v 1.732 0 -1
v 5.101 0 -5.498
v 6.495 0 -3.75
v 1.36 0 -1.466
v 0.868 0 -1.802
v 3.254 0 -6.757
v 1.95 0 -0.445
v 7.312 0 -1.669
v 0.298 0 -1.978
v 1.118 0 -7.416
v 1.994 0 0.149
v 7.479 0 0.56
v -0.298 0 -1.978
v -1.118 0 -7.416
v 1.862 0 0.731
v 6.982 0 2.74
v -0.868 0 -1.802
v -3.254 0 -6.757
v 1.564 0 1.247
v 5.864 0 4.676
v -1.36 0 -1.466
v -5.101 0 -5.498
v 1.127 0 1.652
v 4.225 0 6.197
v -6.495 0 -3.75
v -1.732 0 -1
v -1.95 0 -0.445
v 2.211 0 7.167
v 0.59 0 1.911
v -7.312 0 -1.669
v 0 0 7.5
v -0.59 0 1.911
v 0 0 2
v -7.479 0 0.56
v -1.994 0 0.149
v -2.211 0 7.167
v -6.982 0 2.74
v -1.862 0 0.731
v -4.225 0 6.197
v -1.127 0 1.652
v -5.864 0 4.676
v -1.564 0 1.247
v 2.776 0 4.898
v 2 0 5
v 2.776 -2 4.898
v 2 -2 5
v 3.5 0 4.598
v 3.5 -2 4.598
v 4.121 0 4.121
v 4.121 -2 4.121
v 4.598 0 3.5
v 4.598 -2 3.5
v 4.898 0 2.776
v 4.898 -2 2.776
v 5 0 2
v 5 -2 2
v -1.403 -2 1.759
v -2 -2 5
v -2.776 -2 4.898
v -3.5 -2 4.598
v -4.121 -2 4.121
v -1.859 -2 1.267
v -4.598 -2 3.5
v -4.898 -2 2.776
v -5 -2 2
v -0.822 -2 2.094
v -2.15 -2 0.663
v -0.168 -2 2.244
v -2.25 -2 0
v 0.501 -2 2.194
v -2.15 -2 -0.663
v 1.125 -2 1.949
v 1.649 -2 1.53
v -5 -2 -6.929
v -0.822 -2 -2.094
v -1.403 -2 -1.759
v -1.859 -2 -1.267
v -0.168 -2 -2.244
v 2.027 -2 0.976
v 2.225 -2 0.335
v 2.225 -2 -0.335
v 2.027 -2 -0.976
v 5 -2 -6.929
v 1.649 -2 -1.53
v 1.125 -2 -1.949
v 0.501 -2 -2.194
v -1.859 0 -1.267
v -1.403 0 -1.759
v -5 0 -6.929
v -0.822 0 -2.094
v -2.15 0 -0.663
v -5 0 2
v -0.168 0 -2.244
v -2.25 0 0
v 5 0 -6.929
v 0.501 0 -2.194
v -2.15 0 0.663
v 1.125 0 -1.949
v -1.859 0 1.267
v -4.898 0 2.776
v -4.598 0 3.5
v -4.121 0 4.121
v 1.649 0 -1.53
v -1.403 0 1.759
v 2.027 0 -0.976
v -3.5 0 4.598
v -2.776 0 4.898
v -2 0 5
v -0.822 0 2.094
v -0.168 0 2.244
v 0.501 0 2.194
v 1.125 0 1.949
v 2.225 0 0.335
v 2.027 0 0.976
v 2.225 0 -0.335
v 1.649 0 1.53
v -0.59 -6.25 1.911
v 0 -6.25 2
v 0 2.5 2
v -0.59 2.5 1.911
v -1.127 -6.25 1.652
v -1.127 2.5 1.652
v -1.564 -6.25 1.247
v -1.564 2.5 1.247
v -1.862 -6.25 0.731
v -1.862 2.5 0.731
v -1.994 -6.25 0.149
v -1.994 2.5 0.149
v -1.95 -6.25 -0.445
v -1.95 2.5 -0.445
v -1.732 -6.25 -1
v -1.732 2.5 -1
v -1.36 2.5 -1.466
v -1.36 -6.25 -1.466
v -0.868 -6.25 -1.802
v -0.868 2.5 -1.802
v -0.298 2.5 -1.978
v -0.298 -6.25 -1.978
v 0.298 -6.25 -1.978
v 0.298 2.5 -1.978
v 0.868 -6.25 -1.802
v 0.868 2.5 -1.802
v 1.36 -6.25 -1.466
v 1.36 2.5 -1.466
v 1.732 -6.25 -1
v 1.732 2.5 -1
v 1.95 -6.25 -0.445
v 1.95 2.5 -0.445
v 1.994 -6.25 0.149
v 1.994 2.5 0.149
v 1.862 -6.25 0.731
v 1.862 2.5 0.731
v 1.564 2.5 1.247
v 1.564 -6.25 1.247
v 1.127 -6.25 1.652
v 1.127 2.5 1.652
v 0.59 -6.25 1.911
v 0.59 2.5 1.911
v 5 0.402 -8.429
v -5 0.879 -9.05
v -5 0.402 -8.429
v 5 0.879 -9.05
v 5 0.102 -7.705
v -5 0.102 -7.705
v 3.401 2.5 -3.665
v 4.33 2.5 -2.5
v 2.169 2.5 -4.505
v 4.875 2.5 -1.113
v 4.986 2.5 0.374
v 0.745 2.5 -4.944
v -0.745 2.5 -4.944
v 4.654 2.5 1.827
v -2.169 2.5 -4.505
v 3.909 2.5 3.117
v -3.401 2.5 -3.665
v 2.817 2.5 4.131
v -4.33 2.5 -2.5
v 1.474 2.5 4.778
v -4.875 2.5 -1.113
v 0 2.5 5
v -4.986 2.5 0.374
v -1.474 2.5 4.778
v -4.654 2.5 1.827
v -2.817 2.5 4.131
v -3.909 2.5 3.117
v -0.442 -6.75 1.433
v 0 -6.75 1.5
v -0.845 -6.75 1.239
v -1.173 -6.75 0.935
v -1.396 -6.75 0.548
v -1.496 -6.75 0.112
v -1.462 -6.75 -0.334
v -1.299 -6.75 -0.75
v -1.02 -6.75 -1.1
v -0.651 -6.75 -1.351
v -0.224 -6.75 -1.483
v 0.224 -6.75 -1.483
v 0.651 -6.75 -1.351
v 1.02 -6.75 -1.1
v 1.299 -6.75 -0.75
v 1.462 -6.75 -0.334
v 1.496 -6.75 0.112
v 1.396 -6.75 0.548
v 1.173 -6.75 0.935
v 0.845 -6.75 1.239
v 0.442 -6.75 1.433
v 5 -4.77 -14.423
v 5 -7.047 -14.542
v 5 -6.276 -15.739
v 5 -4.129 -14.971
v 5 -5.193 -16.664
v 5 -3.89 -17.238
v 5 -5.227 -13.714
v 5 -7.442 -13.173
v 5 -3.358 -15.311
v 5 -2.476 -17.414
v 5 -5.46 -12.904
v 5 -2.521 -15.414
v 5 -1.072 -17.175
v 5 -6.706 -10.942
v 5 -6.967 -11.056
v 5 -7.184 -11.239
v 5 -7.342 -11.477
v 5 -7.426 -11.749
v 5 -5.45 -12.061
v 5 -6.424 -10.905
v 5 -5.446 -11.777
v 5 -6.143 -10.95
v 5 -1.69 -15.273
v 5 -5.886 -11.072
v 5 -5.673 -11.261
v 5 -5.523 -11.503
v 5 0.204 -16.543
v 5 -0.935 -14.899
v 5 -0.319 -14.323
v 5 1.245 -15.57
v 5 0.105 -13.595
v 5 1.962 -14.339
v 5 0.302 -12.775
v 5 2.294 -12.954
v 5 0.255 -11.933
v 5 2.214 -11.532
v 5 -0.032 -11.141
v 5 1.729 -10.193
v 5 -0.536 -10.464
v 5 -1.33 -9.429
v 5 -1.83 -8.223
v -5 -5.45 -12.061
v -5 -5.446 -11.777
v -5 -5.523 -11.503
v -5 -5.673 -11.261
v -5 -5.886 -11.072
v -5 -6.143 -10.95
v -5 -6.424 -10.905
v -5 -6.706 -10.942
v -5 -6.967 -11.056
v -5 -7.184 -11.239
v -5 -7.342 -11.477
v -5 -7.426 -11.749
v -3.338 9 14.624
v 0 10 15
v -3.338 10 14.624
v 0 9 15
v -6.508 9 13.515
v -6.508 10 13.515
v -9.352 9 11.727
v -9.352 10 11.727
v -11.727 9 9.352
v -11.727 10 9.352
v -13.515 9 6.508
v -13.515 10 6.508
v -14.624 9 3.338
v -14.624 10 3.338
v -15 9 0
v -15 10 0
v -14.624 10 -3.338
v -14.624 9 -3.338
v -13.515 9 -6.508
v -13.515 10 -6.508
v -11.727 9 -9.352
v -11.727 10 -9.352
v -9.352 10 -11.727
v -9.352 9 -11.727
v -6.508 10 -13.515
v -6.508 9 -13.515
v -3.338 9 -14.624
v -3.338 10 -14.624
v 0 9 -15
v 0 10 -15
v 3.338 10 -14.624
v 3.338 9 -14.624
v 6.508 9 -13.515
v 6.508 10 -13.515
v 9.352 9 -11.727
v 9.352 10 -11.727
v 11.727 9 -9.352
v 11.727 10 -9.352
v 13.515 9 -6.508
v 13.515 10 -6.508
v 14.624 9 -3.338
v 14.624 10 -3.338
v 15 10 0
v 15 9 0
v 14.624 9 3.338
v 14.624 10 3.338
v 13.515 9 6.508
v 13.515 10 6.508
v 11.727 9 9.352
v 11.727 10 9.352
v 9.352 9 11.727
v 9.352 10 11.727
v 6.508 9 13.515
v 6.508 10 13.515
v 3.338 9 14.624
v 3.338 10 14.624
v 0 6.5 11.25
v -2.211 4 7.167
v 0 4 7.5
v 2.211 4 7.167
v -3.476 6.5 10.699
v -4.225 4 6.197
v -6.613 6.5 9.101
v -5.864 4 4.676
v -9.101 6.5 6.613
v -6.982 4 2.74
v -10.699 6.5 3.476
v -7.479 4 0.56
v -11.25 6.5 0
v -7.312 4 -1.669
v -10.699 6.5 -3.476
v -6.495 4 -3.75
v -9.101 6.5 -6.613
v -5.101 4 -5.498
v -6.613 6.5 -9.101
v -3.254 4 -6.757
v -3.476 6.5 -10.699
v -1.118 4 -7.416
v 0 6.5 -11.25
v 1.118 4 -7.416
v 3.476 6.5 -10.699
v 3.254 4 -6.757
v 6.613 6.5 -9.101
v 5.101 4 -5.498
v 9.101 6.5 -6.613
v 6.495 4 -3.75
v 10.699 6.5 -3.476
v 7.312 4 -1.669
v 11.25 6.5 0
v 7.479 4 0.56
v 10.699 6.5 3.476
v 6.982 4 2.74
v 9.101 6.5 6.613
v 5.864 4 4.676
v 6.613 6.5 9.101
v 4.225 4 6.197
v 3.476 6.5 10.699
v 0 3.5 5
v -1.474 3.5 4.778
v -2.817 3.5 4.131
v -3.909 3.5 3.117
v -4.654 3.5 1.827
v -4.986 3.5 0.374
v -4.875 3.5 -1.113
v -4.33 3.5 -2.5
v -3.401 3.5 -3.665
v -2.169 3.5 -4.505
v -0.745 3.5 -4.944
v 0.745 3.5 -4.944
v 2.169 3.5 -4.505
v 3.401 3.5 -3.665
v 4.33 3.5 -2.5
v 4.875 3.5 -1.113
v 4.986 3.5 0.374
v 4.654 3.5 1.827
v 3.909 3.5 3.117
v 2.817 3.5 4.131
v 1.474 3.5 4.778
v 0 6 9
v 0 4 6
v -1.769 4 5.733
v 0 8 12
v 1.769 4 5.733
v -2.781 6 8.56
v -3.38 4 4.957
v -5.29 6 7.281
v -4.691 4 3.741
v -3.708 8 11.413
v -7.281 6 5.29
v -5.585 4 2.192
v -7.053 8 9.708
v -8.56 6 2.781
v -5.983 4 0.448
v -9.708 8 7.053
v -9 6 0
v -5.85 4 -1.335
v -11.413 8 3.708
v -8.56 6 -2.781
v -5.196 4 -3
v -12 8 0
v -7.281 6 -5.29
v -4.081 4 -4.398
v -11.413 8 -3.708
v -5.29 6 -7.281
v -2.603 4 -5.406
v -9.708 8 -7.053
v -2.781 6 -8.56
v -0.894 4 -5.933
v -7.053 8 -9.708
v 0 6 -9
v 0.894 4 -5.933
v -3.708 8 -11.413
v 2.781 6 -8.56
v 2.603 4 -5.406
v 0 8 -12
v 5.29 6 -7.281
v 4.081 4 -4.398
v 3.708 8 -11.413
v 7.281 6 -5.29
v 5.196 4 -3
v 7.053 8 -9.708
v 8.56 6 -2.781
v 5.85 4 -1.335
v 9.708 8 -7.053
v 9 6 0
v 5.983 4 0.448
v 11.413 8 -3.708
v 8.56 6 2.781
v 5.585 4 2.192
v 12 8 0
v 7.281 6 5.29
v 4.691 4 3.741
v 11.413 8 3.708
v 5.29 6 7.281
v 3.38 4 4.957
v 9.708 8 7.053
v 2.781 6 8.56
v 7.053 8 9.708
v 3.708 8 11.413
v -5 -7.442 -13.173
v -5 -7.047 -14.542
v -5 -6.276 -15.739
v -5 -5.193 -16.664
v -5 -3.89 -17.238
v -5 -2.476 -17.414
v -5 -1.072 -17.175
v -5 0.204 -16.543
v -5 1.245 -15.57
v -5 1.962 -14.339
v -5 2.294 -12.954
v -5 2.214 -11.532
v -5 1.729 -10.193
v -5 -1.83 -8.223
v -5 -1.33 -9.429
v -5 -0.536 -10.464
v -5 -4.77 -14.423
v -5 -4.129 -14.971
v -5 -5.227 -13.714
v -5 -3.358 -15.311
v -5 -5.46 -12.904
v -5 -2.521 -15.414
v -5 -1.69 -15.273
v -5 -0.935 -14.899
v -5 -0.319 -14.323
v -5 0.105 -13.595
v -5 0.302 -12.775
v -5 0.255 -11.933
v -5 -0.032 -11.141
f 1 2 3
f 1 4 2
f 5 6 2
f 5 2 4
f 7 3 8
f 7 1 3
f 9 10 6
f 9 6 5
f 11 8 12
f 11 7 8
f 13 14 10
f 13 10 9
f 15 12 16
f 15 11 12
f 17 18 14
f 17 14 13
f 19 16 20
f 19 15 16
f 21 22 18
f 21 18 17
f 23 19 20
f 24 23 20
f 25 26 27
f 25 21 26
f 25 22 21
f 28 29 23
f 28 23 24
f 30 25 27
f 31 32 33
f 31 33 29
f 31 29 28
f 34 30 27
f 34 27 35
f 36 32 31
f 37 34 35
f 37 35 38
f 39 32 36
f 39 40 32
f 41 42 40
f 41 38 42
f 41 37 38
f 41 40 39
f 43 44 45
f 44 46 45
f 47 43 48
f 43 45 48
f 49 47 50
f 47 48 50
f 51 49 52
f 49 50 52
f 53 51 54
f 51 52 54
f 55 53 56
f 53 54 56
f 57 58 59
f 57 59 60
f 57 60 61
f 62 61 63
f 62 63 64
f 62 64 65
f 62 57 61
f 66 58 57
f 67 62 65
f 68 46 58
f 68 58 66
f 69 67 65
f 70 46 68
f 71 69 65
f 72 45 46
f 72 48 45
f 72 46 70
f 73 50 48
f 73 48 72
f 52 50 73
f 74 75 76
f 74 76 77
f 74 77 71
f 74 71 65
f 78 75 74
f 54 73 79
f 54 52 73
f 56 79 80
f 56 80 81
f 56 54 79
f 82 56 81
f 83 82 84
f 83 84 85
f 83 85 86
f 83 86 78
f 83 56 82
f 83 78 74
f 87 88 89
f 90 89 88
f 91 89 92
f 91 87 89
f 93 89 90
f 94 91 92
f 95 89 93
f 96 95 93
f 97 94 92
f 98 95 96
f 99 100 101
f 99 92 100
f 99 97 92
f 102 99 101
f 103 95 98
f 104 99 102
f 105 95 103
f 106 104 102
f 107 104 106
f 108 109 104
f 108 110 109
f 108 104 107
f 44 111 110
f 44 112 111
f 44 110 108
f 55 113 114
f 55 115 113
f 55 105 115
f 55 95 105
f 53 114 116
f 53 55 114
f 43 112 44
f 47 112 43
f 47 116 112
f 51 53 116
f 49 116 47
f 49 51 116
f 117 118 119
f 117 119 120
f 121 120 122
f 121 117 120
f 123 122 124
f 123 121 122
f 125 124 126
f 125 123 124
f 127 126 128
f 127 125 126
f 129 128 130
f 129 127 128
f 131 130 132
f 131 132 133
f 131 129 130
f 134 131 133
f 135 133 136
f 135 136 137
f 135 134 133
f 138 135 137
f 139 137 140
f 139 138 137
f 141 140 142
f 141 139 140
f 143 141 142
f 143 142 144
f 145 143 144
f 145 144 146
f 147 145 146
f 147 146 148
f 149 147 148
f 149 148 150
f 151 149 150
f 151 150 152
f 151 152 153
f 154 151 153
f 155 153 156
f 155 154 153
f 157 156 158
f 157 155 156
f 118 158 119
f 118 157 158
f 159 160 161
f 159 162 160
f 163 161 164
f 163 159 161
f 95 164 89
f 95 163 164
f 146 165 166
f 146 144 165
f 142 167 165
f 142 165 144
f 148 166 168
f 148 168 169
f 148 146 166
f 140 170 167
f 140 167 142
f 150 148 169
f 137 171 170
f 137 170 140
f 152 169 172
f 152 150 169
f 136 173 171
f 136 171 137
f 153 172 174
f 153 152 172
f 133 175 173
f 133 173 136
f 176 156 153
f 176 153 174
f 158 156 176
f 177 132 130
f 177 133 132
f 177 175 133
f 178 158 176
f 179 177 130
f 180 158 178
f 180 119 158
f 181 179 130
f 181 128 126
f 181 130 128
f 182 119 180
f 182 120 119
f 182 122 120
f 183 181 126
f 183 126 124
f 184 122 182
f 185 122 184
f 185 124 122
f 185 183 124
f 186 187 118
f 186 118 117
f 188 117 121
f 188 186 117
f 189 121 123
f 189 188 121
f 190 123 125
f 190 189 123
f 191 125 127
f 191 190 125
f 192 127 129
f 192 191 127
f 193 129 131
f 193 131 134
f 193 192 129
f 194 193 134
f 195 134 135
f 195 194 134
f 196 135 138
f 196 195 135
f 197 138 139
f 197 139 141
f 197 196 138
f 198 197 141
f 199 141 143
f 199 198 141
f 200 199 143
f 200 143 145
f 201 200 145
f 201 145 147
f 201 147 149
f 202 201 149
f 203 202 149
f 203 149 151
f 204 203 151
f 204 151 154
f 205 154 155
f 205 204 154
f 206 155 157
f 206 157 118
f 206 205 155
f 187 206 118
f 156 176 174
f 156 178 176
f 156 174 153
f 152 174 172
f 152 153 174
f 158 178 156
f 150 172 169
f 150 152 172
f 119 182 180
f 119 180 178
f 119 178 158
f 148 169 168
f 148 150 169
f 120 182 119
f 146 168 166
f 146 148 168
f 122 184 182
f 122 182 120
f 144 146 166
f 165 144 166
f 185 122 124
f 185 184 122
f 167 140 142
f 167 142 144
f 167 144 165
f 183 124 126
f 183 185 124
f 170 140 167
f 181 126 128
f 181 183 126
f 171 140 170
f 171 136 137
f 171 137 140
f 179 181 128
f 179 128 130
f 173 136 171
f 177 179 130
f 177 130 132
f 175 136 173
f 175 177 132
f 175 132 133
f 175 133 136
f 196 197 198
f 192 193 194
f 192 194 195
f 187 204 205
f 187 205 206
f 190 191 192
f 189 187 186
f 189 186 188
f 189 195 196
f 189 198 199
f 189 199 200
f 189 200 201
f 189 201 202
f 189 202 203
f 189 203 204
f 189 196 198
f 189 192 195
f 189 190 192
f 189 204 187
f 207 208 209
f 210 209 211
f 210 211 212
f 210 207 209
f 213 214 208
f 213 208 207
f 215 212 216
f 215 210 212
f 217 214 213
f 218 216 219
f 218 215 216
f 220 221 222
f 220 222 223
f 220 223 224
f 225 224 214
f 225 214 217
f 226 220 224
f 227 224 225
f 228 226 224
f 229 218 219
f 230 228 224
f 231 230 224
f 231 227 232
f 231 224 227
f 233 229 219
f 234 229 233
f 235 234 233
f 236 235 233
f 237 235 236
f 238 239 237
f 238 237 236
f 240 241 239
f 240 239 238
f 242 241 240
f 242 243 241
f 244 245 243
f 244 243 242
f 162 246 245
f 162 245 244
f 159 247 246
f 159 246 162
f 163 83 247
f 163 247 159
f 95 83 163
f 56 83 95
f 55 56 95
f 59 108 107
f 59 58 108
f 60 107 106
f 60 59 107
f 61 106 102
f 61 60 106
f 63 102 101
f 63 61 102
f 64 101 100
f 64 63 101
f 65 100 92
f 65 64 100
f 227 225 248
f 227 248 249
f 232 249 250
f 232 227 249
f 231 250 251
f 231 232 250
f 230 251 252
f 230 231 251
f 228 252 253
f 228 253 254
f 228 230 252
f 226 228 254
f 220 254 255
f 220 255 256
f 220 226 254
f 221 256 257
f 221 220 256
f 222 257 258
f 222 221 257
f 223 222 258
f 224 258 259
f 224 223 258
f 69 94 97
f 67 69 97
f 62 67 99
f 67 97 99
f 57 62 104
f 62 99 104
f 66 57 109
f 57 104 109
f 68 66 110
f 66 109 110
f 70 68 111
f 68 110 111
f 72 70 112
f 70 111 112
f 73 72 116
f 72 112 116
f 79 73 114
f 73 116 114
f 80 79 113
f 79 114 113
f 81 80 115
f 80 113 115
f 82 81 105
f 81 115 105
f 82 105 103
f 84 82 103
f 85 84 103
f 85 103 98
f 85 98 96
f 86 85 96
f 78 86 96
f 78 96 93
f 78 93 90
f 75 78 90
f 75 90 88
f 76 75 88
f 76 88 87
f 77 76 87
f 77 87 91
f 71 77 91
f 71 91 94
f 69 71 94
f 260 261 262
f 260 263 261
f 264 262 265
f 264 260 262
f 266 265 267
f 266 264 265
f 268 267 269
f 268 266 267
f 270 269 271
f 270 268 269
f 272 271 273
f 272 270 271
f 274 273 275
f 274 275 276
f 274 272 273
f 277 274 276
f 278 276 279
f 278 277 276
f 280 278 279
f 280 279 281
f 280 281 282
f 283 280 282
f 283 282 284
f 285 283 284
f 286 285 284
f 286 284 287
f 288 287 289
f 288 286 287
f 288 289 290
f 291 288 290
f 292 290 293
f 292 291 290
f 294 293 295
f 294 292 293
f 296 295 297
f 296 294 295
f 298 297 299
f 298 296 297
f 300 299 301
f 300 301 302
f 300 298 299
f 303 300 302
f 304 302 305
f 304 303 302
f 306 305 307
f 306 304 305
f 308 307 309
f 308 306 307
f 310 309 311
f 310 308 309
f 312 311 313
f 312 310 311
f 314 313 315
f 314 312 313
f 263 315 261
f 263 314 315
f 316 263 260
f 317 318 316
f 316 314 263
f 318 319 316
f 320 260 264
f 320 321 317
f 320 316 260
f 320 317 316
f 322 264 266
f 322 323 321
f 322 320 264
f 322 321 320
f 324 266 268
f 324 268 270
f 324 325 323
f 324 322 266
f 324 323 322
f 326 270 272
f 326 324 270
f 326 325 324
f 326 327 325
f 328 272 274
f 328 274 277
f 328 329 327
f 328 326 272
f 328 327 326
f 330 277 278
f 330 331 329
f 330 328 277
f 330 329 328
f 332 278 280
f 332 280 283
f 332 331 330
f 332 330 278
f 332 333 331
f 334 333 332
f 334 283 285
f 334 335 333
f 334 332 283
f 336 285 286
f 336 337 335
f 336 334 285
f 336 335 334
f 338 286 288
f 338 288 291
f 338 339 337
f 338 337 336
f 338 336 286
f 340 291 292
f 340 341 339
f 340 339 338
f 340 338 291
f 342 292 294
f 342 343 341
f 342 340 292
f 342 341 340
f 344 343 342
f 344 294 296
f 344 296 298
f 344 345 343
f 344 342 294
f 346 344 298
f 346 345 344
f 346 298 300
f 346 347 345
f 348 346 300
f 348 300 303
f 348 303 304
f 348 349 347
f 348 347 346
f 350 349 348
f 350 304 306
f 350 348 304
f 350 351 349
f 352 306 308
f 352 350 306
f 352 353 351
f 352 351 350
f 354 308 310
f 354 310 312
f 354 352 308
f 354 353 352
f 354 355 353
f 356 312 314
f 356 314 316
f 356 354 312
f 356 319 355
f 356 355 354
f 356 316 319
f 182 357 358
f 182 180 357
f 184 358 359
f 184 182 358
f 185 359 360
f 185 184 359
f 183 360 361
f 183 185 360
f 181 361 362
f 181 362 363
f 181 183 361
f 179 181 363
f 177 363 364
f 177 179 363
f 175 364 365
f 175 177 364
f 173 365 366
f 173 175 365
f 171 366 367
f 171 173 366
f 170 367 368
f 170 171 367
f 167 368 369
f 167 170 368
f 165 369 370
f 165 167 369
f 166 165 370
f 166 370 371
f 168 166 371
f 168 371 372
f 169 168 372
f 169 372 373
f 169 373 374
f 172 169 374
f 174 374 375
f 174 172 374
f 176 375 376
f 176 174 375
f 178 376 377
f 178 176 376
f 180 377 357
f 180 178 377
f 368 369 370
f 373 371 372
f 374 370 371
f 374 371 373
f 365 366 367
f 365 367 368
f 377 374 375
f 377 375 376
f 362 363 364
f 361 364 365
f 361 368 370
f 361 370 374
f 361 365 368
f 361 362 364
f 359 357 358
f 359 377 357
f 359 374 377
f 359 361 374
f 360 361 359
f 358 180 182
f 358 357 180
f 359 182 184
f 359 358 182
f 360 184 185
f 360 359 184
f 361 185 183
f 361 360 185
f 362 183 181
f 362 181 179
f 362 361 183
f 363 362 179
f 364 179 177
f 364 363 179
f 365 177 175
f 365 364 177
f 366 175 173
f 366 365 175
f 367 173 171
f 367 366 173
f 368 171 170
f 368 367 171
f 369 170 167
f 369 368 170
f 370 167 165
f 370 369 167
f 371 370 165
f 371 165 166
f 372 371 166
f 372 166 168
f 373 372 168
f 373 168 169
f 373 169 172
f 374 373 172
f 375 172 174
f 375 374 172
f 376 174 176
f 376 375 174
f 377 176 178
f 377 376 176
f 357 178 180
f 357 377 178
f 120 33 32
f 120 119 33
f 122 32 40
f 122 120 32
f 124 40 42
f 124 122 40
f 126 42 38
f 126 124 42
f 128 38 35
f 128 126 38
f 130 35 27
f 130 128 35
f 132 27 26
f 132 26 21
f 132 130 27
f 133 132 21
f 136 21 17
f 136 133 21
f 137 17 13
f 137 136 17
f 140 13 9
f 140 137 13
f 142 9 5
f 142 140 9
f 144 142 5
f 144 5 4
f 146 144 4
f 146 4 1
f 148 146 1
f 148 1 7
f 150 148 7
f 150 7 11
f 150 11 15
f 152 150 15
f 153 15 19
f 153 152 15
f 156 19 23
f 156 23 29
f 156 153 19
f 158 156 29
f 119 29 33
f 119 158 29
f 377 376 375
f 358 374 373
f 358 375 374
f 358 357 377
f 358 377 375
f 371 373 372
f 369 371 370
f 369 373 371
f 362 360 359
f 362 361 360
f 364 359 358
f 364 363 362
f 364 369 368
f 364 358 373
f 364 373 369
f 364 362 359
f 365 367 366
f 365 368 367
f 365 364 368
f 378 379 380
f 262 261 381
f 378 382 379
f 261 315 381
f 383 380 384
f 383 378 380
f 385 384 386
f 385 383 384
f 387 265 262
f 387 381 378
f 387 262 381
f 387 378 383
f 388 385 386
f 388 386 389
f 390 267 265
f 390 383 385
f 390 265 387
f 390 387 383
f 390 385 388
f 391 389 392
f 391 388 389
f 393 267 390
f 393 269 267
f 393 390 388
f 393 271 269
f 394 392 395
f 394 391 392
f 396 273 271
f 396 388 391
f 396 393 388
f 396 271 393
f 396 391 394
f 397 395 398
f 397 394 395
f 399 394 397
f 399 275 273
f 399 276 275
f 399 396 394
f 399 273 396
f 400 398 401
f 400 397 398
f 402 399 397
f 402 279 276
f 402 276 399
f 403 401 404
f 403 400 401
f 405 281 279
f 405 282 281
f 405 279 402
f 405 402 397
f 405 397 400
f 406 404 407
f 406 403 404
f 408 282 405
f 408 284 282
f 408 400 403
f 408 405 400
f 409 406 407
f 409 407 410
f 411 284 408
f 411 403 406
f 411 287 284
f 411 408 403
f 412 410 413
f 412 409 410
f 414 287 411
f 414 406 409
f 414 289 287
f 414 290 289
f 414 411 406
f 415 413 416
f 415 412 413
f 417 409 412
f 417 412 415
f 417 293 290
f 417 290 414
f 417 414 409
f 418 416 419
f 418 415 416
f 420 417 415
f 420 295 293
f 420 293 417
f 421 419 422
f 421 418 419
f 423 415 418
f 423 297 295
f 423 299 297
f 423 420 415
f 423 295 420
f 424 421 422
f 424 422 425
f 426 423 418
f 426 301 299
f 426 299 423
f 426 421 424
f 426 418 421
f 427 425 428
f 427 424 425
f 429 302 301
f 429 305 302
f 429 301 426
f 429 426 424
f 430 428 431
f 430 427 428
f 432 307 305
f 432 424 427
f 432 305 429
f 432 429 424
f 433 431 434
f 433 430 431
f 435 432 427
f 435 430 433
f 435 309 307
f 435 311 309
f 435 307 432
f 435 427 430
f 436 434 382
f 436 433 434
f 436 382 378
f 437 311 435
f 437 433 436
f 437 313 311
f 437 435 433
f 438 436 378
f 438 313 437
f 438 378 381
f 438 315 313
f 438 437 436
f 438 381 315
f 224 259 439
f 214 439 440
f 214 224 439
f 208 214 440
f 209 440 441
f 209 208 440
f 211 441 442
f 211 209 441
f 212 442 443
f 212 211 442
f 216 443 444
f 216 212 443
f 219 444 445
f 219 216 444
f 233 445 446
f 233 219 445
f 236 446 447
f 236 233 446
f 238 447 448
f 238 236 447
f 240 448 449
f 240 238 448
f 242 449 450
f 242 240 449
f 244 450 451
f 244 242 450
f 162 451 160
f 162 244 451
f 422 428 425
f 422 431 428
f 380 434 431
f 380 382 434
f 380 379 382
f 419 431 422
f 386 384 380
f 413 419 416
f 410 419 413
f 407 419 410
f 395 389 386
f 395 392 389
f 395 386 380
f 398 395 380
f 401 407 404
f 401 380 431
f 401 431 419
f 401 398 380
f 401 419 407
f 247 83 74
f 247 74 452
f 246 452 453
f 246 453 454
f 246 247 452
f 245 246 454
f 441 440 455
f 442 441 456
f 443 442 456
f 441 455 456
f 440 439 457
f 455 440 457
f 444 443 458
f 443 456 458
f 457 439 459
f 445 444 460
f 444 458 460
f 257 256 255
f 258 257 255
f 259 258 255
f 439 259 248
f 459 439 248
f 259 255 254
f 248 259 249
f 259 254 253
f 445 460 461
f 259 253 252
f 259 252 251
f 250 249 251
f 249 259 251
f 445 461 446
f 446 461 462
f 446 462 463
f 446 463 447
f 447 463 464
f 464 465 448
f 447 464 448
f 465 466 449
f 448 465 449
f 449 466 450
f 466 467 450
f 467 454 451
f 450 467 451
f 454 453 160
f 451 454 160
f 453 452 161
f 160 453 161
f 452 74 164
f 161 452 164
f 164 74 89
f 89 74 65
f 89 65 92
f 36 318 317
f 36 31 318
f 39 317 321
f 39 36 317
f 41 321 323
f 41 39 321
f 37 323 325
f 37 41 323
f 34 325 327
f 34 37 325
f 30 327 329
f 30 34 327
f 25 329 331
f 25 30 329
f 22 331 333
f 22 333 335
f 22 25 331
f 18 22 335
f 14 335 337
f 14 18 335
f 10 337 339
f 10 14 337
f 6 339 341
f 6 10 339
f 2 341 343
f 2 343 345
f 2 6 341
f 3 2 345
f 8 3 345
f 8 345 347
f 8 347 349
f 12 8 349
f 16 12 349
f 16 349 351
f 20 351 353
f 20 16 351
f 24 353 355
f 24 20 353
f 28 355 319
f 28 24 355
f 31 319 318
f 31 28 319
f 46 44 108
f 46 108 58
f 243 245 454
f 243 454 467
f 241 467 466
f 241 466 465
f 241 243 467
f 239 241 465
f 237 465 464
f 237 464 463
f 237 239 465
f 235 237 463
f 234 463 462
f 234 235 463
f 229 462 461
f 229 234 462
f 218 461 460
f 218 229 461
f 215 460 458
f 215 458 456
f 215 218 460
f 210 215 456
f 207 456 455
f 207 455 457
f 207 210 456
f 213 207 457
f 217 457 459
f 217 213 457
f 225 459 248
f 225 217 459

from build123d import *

# Parameters (mm, degrees)
F3_SIZE  = 0.5
F5_DEPTH = 5
F6_R     = 3
F8_D     = 4.5


with BuildPart() as f1:
    # F0 (on Right) → F1 (revolve)
    with BuildSketch(Plane.YZ):
        Polygon((3.5, 5), (3.5, 0), (4, 0), (4, 6), (10, 15), (9, 15), (4, 7.5), (0, 7.5), (0, 2), (2.5, 2), (2.5, 5), align=None)
    revolve(axis=Axis((0, -3.375, 0), (0, -1, 0)))


with BuildPart() as f2:
    # F0 (on Right) → F2 (revolve)
    with BuildSketch(Plane.YZ):
        Polygon((-6.75, 0), (0, 0), (3.5, 0), (3.5, 5), (2.5, 5), (2.5, 2), (0, 2), (-6.75, 2), align=None)
    revolve(axis=Axis((0, -3.375, 0), (0, -1, 0)))

    # F3
    f3_edges = [f2.edges().sort_by_distance(p)[0] for p in [
        (0, -6.75, -2),
    ]]
    chamfer(f3_edges, length=F3_SIZE)


with BuildPart() as f5:
    # F4 (on Right) → F5 (new body, symmetric)
    with BuildSketch(Plane.YZ):
        with BuildLine():
            Line((0, 5), (-2, 5))
            Line((-2, 5), (-2, -6.9289321881))
            ThreePointArc((-2, -6.9289321881), (-1.6193976626, -8.84234935), (-0.5355339059, -10.4644660941))
            ThreePointArc((-0.5355339059, -10.4644660941), (-1.6899942877, -15.2731396568), (-5.4504397591, -12.0614158109))
            ThreePointArc((-5.4504397591, -12.0614158109), (-6.2816936347, -10.9172930053), (-7.4258164403, -11.7485468808))
            ThreePointArc((-7.4258164403, -11.7485468808), (-1.0719602989, -17.1752526894), (0.8786796564, -9.0502525317))
            ThreePointArc((0.8786796564, -9.0502525317), (0.2283614025, -8.0769824852), (0, -6.9289321881))
            Line((0, -6.9289321881), (0, 5))
        make_face()
    extrude(amount=F5_DEPTH, both=True)

    # F6
    f6_edges = [f5.edges().sort_by_distance(p)[0] for p in [
        (-5, -1, 5),
        (5, -1, 5),
    ]]
    fillet(f6_edges, radius=F6_R)

    # F8 (through all)
    with Locations(Plane.XZ.offset(2)):
        with Locations((0, 0)):
            Hole(F8_D / 2)


solid = Compound([f1.part, f2.part, f5.part])
